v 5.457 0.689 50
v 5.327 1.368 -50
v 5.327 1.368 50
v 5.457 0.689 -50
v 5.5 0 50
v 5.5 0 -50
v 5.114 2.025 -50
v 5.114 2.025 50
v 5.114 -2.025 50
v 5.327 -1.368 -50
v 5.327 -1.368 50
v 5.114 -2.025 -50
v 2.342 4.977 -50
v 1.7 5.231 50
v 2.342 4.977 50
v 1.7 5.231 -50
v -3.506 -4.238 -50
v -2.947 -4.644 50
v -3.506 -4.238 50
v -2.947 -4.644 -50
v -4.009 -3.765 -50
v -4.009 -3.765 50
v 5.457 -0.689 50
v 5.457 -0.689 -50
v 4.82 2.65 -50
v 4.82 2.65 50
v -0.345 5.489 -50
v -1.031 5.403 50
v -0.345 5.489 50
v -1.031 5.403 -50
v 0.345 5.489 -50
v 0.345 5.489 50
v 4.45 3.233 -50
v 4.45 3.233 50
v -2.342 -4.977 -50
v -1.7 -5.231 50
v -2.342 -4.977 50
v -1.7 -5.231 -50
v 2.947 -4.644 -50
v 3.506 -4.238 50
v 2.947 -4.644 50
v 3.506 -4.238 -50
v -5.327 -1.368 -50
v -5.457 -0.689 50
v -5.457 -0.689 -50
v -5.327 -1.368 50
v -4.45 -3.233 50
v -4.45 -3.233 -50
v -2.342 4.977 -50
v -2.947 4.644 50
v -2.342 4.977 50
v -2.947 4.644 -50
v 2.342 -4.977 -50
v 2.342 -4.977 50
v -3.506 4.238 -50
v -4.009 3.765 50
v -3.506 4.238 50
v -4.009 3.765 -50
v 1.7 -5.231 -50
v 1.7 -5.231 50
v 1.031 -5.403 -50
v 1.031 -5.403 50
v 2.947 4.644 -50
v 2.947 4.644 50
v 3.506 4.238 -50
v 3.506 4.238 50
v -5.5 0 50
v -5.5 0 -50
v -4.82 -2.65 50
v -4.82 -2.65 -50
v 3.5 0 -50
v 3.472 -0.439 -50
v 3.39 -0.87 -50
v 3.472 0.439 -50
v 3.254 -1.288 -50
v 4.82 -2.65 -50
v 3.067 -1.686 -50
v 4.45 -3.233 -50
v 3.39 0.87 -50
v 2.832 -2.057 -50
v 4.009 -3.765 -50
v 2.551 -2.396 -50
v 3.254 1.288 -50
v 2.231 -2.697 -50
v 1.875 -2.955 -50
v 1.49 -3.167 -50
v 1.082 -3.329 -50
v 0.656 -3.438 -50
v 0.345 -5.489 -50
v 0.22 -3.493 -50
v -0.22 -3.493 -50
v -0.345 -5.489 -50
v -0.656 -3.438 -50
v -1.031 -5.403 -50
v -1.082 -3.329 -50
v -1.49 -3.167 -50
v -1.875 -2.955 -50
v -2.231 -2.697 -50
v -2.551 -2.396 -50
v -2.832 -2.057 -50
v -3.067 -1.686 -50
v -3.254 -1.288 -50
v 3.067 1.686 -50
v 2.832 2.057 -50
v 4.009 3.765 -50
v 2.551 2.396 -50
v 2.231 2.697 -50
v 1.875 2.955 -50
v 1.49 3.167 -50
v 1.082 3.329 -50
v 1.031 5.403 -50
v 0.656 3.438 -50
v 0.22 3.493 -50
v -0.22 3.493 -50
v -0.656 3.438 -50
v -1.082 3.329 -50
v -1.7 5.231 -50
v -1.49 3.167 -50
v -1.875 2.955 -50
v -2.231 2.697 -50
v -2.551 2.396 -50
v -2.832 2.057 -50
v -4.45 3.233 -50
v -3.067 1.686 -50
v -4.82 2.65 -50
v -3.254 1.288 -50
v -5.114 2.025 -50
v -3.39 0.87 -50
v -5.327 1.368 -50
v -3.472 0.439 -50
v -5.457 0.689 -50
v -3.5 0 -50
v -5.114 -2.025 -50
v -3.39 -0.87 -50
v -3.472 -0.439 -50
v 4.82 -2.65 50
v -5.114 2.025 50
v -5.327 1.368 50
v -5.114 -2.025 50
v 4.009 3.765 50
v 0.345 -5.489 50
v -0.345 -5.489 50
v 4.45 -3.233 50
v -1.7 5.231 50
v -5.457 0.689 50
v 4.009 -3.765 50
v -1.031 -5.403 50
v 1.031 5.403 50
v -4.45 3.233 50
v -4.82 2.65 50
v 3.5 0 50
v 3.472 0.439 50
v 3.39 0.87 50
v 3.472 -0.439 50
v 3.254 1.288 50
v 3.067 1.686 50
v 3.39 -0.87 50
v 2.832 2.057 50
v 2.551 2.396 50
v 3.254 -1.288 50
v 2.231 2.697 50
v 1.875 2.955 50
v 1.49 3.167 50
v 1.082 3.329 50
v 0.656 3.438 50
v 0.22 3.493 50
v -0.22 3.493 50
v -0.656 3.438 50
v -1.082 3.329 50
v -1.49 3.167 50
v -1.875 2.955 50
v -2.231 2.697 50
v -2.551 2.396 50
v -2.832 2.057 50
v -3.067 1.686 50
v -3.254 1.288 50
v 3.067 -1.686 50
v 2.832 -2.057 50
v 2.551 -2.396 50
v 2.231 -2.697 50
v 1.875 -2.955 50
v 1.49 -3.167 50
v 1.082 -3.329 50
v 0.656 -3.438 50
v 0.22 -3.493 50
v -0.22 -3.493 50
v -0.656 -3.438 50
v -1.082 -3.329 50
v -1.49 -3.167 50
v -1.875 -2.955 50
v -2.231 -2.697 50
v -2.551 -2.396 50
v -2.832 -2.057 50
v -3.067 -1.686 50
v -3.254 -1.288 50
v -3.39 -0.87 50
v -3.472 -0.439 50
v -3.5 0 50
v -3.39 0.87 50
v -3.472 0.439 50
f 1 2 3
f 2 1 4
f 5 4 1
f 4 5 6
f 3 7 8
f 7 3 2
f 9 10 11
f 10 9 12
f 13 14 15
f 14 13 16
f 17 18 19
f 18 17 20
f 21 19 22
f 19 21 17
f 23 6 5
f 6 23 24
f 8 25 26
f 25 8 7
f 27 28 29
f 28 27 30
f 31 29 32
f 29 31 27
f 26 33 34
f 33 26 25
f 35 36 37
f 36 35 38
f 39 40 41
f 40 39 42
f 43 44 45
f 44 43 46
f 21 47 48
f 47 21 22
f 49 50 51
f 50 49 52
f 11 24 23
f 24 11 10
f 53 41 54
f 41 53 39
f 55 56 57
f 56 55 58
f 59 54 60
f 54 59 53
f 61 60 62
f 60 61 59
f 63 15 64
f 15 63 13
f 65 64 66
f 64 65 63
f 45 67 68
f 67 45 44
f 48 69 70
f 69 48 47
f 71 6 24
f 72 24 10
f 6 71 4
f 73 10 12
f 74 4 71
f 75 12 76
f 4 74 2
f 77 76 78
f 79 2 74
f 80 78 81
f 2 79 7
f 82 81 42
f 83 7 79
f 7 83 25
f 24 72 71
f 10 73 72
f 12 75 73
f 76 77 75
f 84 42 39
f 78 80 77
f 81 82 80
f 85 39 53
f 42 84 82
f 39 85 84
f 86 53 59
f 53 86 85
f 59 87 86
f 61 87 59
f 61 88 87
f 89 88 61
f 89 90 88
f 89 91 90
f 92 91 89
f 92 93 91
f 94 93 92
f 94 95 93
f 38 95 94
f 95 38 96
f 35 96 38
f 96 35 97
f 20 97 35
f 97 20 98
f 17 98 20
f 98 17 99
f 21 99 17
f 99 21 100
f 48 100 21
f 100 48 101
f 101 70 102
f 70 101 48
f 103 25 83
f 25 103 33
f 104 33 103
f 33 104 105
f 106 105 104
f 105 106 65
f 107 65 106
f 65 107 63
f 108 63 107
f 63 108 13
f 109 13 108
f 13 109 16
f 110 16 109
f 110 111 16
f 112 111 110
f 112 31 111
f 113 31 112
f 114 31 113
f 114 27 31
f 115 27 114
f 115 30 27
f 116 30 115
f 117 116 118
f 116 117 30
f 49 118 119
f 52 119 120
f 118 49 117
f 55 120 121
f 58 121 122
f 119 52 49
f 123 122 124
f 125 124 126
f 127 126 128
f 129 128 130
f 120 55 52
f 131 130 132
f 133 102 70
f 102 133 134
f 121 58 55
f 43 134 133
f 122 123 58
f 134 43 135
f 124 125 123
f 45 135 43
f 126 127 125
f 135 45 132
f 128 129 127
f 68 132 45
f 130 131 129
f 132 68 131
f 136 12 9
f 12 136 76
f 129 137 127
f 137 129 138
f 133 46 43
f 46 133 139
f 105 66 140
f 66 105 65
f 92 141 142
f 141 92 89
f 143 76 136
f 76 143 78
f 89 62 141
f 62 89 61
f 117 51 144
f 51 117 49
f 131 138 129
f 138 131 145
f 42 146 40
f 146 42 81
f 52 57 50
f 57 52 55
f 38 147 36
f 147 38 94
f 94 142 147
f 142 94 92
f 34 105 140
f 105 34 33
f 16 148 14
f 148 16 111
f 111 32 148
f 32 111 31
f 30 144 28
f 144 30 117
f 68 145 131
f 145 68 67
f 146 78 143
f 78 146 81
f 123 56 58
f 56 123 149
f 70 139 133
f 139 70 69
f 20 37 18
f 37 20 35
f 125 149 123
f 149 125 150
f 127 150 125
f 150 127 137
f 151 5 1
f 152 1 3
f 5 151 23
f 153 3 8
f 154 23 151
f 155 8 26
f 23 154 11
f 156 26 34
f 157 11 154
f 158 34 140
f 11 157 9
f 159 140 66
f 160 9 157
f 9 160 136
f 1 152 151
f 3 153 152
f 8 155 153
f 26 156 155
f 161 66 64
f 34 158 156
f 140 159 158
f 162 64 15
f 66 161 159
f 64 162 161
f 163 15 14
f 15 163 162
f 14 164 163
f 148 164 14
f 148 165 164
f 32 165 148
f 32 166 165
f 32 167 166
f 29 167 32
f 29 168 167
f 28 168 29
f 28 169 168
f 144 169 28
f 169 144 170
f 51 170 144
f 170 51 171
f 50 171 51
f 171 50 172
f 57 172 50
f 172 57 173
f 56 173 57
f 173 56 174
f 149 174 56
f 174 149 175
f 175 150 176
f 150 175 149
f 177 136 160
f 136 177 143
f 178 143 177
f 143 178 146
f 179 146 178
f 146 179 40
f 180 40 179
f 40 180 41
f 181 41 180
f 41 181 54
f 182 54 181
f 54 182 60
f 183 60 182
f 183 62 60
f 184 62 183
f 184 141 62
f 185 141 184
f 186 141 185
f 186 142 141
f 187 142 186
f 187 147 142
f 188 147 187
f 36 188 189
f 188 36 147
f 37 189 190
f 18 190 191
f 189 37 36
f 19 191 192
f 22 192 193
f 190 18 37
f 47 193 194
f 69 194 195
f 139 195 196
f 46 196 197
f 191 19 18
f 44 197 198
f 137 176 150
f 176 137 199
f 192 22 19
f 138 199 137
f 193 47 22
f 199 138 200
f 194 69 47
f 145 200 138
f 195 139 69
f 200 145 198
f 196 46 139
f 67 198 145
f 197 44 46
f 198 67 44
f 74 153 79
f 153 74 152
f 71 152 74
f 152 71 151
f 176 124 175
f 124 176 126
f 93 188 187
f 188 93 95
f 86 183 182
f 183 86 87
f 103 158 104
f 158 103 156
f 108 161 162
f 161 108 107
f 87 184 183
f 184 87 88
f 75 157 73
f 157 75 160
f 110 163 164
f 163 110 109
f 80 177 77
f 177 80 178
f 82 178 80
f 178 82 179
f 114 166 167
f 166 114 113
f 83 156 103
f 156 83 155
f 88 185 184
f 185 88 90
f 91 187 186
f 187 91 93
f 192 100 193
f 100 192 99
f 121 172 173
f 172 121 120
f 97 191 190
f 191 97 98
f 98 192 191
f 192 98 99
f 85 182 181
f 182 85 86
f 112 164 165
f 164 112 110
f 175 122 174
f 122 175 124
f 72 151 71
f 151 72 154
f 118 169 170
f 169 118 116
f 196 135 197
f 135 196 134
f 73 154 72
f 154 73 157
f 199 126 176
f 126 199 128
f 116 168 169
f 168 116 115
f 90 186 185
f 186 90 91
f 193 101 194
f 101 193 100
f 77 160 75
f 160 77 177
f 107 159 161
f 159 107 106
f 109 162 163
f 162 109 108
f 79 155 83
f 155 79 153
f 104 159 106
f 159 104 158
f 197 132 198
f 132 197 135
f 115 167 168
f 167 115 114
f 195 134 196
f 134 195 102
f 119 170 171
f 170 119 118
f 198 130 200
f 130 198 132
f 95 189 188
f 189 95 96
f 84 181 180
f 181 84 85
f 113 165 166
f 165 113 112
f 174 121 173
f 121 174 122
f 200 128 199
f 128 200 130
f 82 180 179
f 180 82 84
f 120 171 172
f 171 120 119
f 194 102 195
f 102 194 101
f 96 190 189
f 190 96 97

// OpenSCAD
$fn = 50;


difference() {
	union() {
		translate(v = [0, 0, -50.0000000000]) {
			cylinder(h = 100, r = 5.5000000000);
		}
	}
	union() {
		translate(v = [0, 0, -100.0000000000]) {
			cylinder(h = 200, r = 3.5000000000);
		}
	}
}
